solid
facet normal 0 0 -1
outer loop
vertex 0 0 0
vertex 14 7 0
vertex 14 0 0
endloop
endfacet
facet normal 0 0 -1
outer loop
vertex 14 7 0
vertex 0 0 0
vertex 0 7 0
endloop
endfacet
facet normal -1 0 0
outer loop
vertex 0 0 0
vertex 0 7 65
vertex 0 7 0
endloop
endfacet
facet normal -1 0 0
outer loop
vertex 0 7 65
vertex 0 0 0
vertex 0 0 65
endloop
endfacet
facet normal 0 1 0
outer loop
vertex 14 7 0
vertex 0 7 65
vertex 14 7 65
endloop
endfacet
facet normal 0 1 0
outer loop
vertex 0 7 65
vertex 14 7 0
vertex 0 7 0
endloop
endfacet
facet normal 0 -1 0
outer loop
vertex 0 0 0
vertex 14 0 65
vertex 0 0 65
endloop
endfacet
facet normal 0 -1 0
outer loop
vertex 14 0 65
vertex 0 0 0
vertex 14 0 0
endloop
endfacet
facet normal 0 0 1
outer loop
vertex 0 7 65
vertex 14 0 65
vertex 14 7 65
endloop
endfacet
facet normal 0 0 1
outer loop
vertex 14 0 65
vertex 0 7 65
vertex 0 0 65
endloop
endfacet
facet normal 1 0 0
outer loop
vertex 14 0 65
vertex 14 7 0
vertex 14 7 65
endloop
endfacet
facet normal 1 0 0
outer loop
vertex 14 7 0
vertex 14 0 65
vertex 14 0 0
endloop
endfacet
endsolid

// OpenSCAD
translate([5.5, 3.5, 2.5]) color([0.898173121357879, 0.9230824398201768, 0.5405999249480544]) cube([11, 7, 5], center=true);
translate([5.5, 3.5, 7.5]) color([0.3912960502346249, 0.7052833998544062, 0.27563412131212717]) cube([11, 7, 5], center=true);
translate([5.5, 3.5, 12.5]) color([0.8116287085078785, 0.8494859651863671, 0.8950389674266752]) cube([11, 7, 5], center=true);
translate([5.5, 3.5, 17.5]) color([0.5898011835311598, 0.9497648732321206, 0.5796950107456059]) cube([11, 7, 5], center=true);
translate([5.5, 3.5, 22.5]) color([0.4505631066311552, 0.660245378622389, 0.9962578393535727]) cube([11, 7, 5], center=true);
translate([5.5, 3.5, 27.5]) color([0.9169412179474561, 0.7933250841302242, 0.0823729881966474]) cube([11, 7, 5], center=true);
translate([5.5, 3.5, 32.5]) color([0.6127831050407122, 0.4864442019691668, 0.6301473404114728]) cube([11, 7, 5], center=true);
translate([5.5, 3.5, 37.5]) color([0.8450775756715152, 0.24303562206185625, 0.7314892207908478]) cube([11, 7, 5], center=true);
translate([5.5, 3.5, 42.5]) color([0.11713429320851798, 0.22046053686782852, 0.7945829717105759]) cube([11, 7, 5], center=true);
translate([5.5, 3.5, 47.5]) color([0.33253614921965546, 0.8159130965336595, 0.1006075202160962]) cube([11, 7, 5], center=true);
translate([5.5, 3.5, 52.5]) color([0.14635848891230385, 0.6976706401912388, 0.04523406786561235]) cube([11, 7, 5], center=true);
translate([5.5, 3.5, 57.5]) color([0.5738660367891669, 0.9100160146990397, 0.534197968260724]) cube([11, 7, 5], center=true);
translate([5.5, 3.5, 62.5]) color([0.6805891325622565, 0.026696794662205203, 0.6349999099114583]) cube([11, 7, 5], center=true);
translate([12.5, 3.5, 2.5]) color([0.6063384177542189, 0.5759529480315407, 0.3912094093228269]) cube([3, 7, 5], center=true);
translate([12.5, 3.5, 7.5]) color([0.3701399403351875, 0.9805166506472687, 0.036392037611485795]) cube([3, 7, 5], center=true);
translate([12.5, 3.5, 12.5]) color([0.021636509855024078, 0.9610312802396112, 0.18497194139743833]) cube([3, 7, 5], center=true);
translate([12.5, 3.5, 17.5]) color([0.12389516442443171, 0.21057650988664645, 0.8007465903541809]) cube([3, 7, 5], center=true);
translate([12.5, 3.5, 22.5]) color([0.9369691586445807, 0.022782575668658378, 0.42561883196681716]) cube([3, 7, 5], center=true);
translate([12.5, 3.5, 27.5]) color([0.10150021937416975, 0.259919889792832, 0.22082927131631735]) cube([3, 7, 5], center=true);
translate([12.5, 3.5, 32.5]) color([0.6469257198353225, 0.3502939673965323, 0.18031790152968785]) cube([3, 7, 5], center=true);
translate([12.5, 3.5, 37.5]) color([0.5036365052098872, 0.03937870708469238, 0.10092124118896661]) cube([3, 7, 5], center=true);
translate([12.5, 3.5, 42.5]) color([0.9882351487225011, 0.19935579046706298, 0.35855530131160185]) cube([3, 7, 5], center=true);
translate([12.5, 3.5, 47.5]) color([0.7315983062253606, 0.8383265651934163, 0.9184820619953314]) cube([3, 7, 5], center=true);
translate([12.5, 3.5, 52.5]) color([0.16942460609746768, 0.6726405635730526, 0.9665489030431832]) cube([3, 7, 5], center=true);
translate([12.5, 3.5, 57.5]) color([0.05805094382649867, 0.6762017842993783, 0.8454245937016164]) cube([3, 7, 5], center=true);
translate([12.5, 3.5, 62.5]) color([0.342312541078584, 0.25068733928511167, 0.596791393469411]) cube([3, 7, 5], center=true);
translate([12.5, 1.0, 57.5]) color([0.44231403369907896, 0.17481948445144113, 0.47162541509628797]) cube([3, 2, 5], center=true);
translate([12.5, 1.0, 62.5]) color([0.40990539565755457, 0.5691127395242802, 0.5086001300626332]) cube([3, 2, 5], center=true);
translate([12.5, 4.5, 56.0]) color([0.3114460010002068, 0.35715168259026286, 0.837661174368979]) cube([3, 5, 2], center=true);
translate([12.5, 4.5, 58.0]) color([0.25093266482213705, 0.560600218853524, 0.012436318829314397]) cube([3, 5, 2], center=true);
translate([12.5, 4.5, 60.0]) color([0.7415743774106636, 0.3359165544734606, 0.04569649356841665]) cube([3, 5, 2], center=true);
translate([12.5, 4.5, 62.0]) color([0.28088316421834825, 0.24013040782635398, 0.9531293398277989]) cube([3, 5, 2], center=true);
translate([12.5, 4.5, 64.0]) color([0.35222556151550743, 0.2878779148564, 0.35920119725374633]) cube([3, 5, 2], center=true);
